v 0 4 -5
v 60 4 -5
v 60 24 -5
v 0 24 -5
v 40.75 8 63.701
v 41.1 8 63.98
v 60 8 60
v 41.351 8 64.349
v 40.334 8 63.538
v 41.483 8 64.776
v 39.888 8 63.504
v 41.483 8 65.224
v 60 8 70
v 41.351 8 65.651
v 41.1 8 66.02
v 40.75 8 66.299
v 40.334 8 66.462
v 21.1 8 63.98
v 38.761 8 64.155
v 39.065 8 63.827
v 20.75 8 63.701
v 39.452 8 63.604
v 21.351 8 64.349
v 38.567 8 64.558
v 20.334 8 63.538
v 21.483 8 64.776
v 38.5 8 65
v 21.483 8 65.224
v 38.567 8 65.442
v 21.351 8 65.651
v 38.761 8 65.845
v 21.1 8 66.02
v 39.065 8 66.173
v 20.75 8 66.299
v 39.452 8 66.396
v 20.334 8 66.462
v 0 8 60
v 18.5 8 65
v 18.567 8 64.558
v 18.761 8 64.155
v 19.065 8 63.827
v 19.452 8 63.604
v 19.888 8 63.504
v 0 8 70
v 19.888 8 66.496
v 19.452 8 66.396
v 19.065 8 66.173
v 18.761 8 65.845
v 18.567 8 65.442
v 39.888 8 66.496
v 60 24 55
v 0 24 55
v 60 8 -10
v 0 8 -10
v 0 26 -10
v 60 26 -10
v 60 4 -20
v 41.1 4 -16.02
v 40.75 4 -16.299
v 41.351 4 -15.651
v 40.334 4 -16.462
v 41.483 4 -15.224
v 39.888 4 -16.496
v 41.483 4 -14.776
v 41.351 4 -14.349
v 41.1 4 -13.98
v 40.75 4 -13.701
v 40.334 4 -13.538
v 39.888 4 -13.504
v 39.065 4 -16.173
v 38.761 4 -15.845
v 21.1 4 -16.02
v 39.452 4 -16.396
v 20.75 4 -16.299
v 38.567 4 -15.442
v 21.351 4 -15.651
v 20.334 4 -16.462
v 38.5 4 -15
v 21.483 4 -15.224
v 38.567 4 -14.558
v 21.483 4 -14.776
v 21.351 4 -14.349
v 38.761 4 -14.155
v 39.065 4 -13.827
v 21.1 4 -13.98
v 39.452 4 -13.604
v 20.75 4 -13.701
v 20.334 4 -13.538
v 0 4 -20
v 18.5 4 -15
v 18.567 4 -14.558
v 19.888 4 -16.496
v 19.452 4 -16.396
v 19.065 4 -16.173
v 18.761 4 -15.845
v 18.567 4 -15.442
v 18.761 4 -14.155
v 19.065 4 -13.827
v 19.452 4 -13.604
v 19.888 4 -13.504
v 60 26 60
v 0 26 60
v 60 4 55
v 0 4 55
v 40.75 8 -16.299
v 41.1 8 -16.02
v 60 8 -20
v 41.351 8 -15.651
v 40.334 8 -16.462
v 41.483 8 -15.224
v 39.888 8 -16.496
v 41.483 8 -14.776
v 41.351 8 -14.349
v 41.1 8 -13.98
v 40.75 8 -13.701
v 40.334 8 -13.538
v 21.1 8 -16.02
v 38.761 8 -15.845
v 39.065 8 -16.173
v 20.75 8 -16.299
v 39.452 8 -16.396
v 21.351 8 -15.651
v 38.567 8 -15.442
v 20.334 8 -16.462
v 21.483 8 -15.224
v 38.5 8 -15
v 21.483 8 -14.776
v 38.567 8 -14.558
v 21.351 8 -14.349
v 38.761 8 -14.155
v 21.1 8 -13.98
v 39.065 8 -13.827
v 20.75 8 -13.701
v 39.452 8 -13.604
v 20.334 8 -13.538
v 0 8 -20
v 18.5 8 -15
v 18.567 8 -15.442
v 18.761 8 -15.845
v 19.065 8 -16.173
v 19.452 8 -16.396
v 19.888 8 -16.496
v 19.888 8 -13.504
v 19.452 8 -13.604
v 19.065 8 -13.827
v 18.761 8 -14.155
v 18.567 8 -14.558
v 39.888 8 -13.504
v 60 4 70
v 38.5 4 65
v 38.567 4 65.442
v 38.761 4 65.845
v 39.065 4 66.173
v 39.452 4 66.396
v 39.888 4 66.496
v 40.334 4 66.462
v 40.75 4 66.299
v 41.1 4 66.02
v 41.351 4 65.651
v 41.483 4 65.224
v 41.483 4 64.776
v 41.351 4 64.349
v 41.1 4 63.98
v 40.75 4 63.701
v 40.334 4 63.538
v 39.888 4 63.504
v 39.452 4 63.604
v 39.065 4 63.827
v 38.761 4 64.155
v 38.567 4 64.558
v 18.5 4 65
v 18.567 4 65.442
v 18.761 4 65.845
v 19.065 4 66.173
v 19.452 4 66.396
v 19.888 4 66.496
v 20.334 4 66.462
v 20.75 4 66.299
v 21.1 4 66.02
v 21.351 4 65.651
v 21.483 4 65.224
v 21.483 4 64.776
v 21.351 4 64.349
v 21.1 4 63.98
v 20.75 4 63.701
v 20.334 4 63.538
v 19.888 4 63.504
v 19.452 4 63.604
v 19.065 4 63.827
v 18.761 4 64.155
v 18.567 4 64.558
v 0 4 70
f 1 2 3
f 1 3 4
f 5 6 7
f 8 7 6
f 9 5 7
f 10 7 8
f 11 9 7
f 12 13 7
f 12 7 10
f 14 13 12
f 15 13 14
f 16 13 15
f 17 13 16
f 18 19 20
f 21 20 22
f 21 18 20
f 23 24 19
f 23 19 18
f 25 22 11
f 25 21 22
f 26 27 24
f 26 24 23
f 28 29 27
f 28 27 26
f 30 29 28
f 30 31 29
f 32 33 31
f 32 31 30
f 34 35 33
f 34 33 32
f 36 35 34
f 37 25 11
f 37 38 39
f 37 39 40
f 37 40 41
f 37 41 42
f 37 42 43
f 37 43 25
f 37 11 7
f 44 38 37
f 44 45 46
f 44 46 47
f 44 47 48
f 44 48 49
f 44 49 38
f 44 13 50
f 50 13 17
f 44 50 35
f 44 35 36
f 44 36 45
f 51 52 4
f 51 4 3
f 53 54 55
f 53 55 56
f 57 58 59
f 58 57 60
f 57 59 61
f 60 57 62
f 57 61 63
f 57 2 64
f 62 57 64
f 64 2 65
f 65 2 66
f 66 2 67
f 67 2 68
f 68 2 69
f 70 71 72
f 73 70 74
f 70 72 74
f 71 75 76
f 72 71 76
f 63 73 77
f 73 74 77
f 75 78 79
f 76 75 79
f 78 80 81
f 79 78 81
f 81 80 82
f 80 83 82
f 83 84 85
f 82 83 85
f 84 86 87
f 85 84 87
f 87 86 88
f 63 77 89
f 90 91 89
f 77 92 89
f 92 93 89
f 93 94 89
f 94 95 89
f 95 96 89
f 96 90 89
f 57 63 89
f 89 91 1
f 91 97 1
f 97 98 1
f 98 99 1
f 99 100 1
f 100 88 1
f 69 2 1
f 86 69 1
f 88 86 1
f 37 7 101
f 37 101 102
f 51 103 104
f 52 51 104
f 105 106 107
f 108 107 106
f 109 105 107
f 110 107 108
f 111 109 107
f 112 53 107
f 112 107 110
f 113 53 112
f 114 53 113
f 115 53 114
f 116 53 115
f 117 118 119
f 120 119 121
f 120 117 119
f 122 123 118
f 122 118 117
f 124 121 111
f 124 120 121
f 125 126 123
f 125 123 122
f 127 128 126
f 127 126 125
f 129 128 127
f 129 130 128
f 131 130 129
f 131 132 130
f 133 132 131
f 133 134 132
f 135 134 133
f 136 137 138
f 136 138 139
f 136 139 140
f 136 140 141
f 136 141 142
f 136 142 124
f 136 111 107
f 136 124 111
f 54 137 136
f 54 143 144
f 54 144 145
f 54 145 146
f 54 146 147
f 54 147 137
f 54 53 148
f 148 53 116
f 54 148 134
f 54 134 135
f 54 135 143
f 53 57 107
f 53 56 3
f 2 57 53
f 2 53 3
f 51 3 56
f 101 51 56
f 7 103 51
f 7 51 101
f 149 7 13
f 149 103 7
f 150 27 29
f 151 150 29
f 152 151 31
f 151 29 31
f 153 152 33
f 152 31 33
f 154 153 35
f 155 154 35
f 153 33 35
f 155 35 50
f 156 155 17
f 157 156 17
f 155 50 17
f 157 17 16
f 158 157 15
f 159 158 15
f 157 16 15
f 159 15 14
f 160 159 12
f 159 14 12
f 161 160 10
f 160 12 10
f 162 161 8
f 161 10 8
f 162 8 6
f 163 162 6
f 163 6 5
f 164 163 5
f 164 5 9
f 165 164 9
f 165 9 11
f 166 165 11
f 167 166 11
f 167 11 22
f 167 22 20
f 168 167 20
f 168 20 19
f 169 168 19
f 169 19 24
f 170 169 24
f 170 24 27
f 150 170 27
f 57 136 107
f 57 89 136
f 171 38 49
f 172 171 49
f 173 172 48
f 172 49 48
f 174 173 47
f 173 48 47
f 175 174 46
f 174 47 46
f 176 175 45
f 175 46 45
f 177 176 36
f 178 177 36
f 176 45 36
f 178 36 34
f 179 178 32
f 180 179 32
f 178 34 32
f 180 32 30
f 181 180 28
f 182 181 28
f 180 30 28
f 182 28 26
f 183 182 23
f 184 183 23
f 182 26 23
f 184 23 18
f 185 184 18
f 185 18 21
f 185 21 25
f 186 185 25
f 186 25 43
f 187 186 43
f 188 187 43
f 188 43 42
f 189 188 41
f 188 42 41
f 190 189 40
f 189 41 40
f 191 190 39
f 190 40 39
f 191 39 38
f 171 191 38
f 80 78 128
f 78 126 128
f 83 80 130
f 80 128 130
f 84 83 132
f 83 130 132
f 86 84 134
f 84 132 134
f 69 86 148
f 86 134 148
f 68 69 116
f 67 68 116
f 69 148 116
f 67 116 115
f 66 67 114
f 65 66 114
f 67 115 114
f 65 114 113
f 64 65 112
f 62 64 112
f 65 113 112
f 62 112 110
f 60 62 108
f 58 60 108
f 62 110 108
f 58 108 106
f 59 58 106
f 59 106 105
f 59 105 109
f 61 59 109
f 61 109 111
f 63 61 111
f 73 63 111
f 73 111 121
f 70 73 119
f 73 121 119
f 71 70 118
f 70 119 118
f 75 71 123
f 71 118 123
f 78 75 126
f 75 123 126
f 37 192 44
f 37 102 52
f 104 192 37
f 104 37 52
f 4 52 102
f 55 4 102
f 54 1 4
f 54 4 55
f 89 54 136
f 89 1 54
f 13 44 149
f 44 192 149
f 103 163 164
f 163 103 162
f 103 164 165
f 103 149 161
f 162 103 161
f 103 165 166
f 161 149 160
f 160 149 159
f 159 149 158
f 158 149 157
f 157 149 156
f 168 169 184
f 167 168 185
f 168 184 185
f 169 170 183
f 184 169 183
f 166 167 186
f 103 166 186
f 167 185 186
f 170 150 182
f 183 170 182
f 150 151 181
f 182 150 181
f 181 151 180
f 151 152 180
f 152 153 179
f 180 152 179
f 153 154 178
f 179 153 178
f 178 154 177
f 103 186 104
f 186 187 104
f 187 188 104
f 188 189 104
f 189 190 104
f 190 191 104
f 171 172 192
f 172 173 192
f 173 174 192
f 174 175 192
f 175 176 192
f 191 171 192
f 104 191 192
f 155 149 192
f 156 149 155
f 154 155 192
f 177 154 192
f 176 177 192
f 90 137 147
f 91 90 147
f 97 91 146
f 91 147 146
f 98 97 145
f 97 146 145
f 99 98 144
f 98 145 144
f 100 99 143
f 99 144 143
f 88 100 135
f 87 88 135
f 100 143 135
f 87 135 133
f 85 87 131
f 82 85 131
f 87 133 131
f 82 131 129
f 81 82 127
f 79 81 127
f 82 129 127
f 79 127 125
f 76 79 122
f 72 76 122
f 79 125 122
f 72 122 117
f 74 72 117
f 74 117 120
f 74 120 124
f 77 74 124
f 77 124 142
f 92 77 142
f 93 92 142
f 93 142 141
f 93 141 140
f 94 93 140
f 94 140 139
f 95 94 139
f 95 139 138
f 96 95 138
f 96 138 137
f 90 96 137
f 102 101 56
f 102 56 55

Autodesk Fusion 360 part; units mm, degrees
sketch "Boceto2" plane through (0, 4, 0) normal (0, 1, 0) x (-1, 0, 0)
  line L0 (9, 0) -> (-1, 0)
  line L1 (-30, 0) -> (-60, 0)
  line L2 (-30, 0) -> (0, 0)
  line L3 (-30, 25) -> (-30, -10)
  line L4 (-30, -10) -> (-60, -10)
  line L5 (-60, -10) -> (-60, 60)
  line L6 (-60, 60) -> (0, 60)
  line L7 (0, 60) -> (0, -10)
  line L8 (0, -10) -> (-30, -10)
  line L9 (0, -10) -> (-5, -10)
  line L10 (-5, -10) -> (-5, -5)
  line L11 (-5, -5) -> (-55, -5)
  line L12 (-55, -5) -> (-55, 55)
  line L13 (-55, 55) -> (-5, 55)
  line L14 (-5, 55) -> (-5, -5)
  dimension "d1" = 10
  dimension "d2" = 30
  dimension "d3" = 30
  dimension "d4" = 35
  dimension "d5" = 70
  dimension "d6" = 5
  dimension "d7" = 5
  dimension "d8" = 50
  dimension "d9" = 60
extrude "Extruir1" add sketch "Boceto2" along normal blind 20 contours L0 L2 L7 L8 L9 L10 L14 | L0 L1 L2 L5 L6 L7 L12 L13 L14 | L3 L8 L10 L11 | L1 L3 L4 L5 L11 L12
sketch "Boceto3" plane through (0, 4, 0) normal (0, 1, 0) x (-1, 0, 0)
  line L0 (0, -10) -> (-5, -10)
  line L1 (-5, -10) -> (-10, -20)
  line L2 (0, -10) -> (0, -20)
  line L3 (0, -20) -> (-60, -20)
  line L4 (-60, -20) -> (-60, -10)
  line L5 (-60, -10) -> (-64.5056, 6.5239)
  line L6 (0, 60) -> (0, 70)
  line L7 (0, 70) -> (-60, 70)
  line L8 (-60, 70) -> (-60, 60)
  line L9 (-60, 60) -> (0, 60)
  line L10 (-5, -10) -> (-60, -10)
  dimension "d12" = 10
  dimension "d13" = 10
extrude "Extruir2" add sketch "Boceto3" along normal blind 4
sketch "Boceto4" plane through (0, 8, 0) normal (0, 1, 0) x (-1, 0, 0)
  line L0 (0, -10) -> (-60, -10)
  line L1 (-60, -10) -> (-60, -20)
  line L2 (-60, -20) -> (0, -20)
  line L3 (0, -20) -> (0, -10)
  line L4 (0, -15) -> (-20, -15)
  line L5 (-26, -15) -> (-35, -15)
  line L6 (-20, -15) -> (-40, -15)
  line L7 (-40, -15) -> (-80, 70)
  line L8 (0, 70) -> (0, 65)
  line L9 (0, 65) -> (-20, 65)
  line L10 (-20, 65) -> (-40, 65)
  circle A0 centre (-40, 65) radius 1.5
  circle A1 centre (-20, 65) radius 1.5
  circle A2 centre (-20, -15) radius 1.5
  circle A3 centre (-40, -15) radius 1.5
  dimension "d16" = 20
  dimension "d17" = 3
  dimension "d18" = 3
  dimension "d19" = 3
  dimension "d20" = 3
extrude "Extruir3" cut sketch "Boceto4" against normal blind 30 contours L6 L7 A3 | L6 L7 A3 | L4 L6 A2 | L4 L6 A2 | L9 L10 A1 | L9 L10 A1 | A0
sketch "Boceto5" plane through (0, 24, 0) normal (0, 1, 0) x (-1, 0, 0)
  line L0 (-55, 55) -> (-5, 55)
  line L1 (-5, 55) -> (-5, -5)
  line L2 (-5, -5) -> (-55, -5)
  line L3 (-55, -5) -> (-55, 55)
  line L4 (0, -10) -> (0, 60)
  line L5 (0, 60) -> (-60, 60)
  line L6 (-60, 60) -> (-60, -10)
  line L7 (-60, -10) -> (0, -10)
  line L8 (0, -10) -> (-60, -10)
  line L9 (-60, 60) -> (-60, -10)
  line L10 (-60, 60) -> (0, 60)
  line L11 (0, -8.1337) -> (20, 20)
  line L12 (0, -10) -> (0, 60)
extrude "Extruir4" add sketch "Boceto5" along normal blind 2 contours L0 L1 L2 L3 | L4 L5 L6 L7 L8 L9 L10 L12
sketch "Boceto6" plane through (60, 0, 0) normal (1, 0, 0) x (0, 0, -1)
  line L0 (-70, 4) -> (20, 4)
  line L1 (20, 4) -> (20, 8)
  line L2 (20, 8) -> (10, 8)
  line L3 (10, 8) -> (10, 26)
  line L4 (10, 26) -> (-60, 26)
  line L5 (-60, 26) -> (-60, 8)
  line L6 (-60, 8) -> (-70, 8)
  line L7 (-70, 8) -> (-70, 4)
sketch "Boceto7" plane through (0, 4, 0) normal (0, -1, 0) x (1, 0, 0)
  circle A0 centre (40, -15) radius 1.5
  circle A1 centre (20, 65) radius 1.5
  circle A2 centre (20, -15) radius 1.5
  circle A3 centre (40, 65) radius 1.5
  line L0 (5, 55) -> (55, 55)
  line L1 (55, 55) -> (55, -5)
  line L2 (55, -5) -> (5, -5)
  line L3 (5, -5) -> (5, 55)
  line L4 (0, 70) -> (0, -20)
  line L5 (0, -20) -> (60, -20)
  line L6 (60, -20) -> (60, 70)
  line L7 (60, 70) -> (0, 70)
  line L8 (5, 55) -> (0, 55)
  line L9 (5, -5) -> (0, -5)
  line L10 (0, 55) -> (0, -5)
  line L11 (5, 55) -> (5, -5)
  line L12 (55, 55) -> (60, 55)
  line L13 (60, 55) -> (60, -5)
  line L14 (55, -5) -> (60, -5)
  line L15 (55, -5) -> (55, 55)
extrude "Extruir5" cut sketch "Boceto7" against normal blind 20 contours L3 L4 L8 L9 L10 L11 | L1 L6 L12 L13 L14 L15
